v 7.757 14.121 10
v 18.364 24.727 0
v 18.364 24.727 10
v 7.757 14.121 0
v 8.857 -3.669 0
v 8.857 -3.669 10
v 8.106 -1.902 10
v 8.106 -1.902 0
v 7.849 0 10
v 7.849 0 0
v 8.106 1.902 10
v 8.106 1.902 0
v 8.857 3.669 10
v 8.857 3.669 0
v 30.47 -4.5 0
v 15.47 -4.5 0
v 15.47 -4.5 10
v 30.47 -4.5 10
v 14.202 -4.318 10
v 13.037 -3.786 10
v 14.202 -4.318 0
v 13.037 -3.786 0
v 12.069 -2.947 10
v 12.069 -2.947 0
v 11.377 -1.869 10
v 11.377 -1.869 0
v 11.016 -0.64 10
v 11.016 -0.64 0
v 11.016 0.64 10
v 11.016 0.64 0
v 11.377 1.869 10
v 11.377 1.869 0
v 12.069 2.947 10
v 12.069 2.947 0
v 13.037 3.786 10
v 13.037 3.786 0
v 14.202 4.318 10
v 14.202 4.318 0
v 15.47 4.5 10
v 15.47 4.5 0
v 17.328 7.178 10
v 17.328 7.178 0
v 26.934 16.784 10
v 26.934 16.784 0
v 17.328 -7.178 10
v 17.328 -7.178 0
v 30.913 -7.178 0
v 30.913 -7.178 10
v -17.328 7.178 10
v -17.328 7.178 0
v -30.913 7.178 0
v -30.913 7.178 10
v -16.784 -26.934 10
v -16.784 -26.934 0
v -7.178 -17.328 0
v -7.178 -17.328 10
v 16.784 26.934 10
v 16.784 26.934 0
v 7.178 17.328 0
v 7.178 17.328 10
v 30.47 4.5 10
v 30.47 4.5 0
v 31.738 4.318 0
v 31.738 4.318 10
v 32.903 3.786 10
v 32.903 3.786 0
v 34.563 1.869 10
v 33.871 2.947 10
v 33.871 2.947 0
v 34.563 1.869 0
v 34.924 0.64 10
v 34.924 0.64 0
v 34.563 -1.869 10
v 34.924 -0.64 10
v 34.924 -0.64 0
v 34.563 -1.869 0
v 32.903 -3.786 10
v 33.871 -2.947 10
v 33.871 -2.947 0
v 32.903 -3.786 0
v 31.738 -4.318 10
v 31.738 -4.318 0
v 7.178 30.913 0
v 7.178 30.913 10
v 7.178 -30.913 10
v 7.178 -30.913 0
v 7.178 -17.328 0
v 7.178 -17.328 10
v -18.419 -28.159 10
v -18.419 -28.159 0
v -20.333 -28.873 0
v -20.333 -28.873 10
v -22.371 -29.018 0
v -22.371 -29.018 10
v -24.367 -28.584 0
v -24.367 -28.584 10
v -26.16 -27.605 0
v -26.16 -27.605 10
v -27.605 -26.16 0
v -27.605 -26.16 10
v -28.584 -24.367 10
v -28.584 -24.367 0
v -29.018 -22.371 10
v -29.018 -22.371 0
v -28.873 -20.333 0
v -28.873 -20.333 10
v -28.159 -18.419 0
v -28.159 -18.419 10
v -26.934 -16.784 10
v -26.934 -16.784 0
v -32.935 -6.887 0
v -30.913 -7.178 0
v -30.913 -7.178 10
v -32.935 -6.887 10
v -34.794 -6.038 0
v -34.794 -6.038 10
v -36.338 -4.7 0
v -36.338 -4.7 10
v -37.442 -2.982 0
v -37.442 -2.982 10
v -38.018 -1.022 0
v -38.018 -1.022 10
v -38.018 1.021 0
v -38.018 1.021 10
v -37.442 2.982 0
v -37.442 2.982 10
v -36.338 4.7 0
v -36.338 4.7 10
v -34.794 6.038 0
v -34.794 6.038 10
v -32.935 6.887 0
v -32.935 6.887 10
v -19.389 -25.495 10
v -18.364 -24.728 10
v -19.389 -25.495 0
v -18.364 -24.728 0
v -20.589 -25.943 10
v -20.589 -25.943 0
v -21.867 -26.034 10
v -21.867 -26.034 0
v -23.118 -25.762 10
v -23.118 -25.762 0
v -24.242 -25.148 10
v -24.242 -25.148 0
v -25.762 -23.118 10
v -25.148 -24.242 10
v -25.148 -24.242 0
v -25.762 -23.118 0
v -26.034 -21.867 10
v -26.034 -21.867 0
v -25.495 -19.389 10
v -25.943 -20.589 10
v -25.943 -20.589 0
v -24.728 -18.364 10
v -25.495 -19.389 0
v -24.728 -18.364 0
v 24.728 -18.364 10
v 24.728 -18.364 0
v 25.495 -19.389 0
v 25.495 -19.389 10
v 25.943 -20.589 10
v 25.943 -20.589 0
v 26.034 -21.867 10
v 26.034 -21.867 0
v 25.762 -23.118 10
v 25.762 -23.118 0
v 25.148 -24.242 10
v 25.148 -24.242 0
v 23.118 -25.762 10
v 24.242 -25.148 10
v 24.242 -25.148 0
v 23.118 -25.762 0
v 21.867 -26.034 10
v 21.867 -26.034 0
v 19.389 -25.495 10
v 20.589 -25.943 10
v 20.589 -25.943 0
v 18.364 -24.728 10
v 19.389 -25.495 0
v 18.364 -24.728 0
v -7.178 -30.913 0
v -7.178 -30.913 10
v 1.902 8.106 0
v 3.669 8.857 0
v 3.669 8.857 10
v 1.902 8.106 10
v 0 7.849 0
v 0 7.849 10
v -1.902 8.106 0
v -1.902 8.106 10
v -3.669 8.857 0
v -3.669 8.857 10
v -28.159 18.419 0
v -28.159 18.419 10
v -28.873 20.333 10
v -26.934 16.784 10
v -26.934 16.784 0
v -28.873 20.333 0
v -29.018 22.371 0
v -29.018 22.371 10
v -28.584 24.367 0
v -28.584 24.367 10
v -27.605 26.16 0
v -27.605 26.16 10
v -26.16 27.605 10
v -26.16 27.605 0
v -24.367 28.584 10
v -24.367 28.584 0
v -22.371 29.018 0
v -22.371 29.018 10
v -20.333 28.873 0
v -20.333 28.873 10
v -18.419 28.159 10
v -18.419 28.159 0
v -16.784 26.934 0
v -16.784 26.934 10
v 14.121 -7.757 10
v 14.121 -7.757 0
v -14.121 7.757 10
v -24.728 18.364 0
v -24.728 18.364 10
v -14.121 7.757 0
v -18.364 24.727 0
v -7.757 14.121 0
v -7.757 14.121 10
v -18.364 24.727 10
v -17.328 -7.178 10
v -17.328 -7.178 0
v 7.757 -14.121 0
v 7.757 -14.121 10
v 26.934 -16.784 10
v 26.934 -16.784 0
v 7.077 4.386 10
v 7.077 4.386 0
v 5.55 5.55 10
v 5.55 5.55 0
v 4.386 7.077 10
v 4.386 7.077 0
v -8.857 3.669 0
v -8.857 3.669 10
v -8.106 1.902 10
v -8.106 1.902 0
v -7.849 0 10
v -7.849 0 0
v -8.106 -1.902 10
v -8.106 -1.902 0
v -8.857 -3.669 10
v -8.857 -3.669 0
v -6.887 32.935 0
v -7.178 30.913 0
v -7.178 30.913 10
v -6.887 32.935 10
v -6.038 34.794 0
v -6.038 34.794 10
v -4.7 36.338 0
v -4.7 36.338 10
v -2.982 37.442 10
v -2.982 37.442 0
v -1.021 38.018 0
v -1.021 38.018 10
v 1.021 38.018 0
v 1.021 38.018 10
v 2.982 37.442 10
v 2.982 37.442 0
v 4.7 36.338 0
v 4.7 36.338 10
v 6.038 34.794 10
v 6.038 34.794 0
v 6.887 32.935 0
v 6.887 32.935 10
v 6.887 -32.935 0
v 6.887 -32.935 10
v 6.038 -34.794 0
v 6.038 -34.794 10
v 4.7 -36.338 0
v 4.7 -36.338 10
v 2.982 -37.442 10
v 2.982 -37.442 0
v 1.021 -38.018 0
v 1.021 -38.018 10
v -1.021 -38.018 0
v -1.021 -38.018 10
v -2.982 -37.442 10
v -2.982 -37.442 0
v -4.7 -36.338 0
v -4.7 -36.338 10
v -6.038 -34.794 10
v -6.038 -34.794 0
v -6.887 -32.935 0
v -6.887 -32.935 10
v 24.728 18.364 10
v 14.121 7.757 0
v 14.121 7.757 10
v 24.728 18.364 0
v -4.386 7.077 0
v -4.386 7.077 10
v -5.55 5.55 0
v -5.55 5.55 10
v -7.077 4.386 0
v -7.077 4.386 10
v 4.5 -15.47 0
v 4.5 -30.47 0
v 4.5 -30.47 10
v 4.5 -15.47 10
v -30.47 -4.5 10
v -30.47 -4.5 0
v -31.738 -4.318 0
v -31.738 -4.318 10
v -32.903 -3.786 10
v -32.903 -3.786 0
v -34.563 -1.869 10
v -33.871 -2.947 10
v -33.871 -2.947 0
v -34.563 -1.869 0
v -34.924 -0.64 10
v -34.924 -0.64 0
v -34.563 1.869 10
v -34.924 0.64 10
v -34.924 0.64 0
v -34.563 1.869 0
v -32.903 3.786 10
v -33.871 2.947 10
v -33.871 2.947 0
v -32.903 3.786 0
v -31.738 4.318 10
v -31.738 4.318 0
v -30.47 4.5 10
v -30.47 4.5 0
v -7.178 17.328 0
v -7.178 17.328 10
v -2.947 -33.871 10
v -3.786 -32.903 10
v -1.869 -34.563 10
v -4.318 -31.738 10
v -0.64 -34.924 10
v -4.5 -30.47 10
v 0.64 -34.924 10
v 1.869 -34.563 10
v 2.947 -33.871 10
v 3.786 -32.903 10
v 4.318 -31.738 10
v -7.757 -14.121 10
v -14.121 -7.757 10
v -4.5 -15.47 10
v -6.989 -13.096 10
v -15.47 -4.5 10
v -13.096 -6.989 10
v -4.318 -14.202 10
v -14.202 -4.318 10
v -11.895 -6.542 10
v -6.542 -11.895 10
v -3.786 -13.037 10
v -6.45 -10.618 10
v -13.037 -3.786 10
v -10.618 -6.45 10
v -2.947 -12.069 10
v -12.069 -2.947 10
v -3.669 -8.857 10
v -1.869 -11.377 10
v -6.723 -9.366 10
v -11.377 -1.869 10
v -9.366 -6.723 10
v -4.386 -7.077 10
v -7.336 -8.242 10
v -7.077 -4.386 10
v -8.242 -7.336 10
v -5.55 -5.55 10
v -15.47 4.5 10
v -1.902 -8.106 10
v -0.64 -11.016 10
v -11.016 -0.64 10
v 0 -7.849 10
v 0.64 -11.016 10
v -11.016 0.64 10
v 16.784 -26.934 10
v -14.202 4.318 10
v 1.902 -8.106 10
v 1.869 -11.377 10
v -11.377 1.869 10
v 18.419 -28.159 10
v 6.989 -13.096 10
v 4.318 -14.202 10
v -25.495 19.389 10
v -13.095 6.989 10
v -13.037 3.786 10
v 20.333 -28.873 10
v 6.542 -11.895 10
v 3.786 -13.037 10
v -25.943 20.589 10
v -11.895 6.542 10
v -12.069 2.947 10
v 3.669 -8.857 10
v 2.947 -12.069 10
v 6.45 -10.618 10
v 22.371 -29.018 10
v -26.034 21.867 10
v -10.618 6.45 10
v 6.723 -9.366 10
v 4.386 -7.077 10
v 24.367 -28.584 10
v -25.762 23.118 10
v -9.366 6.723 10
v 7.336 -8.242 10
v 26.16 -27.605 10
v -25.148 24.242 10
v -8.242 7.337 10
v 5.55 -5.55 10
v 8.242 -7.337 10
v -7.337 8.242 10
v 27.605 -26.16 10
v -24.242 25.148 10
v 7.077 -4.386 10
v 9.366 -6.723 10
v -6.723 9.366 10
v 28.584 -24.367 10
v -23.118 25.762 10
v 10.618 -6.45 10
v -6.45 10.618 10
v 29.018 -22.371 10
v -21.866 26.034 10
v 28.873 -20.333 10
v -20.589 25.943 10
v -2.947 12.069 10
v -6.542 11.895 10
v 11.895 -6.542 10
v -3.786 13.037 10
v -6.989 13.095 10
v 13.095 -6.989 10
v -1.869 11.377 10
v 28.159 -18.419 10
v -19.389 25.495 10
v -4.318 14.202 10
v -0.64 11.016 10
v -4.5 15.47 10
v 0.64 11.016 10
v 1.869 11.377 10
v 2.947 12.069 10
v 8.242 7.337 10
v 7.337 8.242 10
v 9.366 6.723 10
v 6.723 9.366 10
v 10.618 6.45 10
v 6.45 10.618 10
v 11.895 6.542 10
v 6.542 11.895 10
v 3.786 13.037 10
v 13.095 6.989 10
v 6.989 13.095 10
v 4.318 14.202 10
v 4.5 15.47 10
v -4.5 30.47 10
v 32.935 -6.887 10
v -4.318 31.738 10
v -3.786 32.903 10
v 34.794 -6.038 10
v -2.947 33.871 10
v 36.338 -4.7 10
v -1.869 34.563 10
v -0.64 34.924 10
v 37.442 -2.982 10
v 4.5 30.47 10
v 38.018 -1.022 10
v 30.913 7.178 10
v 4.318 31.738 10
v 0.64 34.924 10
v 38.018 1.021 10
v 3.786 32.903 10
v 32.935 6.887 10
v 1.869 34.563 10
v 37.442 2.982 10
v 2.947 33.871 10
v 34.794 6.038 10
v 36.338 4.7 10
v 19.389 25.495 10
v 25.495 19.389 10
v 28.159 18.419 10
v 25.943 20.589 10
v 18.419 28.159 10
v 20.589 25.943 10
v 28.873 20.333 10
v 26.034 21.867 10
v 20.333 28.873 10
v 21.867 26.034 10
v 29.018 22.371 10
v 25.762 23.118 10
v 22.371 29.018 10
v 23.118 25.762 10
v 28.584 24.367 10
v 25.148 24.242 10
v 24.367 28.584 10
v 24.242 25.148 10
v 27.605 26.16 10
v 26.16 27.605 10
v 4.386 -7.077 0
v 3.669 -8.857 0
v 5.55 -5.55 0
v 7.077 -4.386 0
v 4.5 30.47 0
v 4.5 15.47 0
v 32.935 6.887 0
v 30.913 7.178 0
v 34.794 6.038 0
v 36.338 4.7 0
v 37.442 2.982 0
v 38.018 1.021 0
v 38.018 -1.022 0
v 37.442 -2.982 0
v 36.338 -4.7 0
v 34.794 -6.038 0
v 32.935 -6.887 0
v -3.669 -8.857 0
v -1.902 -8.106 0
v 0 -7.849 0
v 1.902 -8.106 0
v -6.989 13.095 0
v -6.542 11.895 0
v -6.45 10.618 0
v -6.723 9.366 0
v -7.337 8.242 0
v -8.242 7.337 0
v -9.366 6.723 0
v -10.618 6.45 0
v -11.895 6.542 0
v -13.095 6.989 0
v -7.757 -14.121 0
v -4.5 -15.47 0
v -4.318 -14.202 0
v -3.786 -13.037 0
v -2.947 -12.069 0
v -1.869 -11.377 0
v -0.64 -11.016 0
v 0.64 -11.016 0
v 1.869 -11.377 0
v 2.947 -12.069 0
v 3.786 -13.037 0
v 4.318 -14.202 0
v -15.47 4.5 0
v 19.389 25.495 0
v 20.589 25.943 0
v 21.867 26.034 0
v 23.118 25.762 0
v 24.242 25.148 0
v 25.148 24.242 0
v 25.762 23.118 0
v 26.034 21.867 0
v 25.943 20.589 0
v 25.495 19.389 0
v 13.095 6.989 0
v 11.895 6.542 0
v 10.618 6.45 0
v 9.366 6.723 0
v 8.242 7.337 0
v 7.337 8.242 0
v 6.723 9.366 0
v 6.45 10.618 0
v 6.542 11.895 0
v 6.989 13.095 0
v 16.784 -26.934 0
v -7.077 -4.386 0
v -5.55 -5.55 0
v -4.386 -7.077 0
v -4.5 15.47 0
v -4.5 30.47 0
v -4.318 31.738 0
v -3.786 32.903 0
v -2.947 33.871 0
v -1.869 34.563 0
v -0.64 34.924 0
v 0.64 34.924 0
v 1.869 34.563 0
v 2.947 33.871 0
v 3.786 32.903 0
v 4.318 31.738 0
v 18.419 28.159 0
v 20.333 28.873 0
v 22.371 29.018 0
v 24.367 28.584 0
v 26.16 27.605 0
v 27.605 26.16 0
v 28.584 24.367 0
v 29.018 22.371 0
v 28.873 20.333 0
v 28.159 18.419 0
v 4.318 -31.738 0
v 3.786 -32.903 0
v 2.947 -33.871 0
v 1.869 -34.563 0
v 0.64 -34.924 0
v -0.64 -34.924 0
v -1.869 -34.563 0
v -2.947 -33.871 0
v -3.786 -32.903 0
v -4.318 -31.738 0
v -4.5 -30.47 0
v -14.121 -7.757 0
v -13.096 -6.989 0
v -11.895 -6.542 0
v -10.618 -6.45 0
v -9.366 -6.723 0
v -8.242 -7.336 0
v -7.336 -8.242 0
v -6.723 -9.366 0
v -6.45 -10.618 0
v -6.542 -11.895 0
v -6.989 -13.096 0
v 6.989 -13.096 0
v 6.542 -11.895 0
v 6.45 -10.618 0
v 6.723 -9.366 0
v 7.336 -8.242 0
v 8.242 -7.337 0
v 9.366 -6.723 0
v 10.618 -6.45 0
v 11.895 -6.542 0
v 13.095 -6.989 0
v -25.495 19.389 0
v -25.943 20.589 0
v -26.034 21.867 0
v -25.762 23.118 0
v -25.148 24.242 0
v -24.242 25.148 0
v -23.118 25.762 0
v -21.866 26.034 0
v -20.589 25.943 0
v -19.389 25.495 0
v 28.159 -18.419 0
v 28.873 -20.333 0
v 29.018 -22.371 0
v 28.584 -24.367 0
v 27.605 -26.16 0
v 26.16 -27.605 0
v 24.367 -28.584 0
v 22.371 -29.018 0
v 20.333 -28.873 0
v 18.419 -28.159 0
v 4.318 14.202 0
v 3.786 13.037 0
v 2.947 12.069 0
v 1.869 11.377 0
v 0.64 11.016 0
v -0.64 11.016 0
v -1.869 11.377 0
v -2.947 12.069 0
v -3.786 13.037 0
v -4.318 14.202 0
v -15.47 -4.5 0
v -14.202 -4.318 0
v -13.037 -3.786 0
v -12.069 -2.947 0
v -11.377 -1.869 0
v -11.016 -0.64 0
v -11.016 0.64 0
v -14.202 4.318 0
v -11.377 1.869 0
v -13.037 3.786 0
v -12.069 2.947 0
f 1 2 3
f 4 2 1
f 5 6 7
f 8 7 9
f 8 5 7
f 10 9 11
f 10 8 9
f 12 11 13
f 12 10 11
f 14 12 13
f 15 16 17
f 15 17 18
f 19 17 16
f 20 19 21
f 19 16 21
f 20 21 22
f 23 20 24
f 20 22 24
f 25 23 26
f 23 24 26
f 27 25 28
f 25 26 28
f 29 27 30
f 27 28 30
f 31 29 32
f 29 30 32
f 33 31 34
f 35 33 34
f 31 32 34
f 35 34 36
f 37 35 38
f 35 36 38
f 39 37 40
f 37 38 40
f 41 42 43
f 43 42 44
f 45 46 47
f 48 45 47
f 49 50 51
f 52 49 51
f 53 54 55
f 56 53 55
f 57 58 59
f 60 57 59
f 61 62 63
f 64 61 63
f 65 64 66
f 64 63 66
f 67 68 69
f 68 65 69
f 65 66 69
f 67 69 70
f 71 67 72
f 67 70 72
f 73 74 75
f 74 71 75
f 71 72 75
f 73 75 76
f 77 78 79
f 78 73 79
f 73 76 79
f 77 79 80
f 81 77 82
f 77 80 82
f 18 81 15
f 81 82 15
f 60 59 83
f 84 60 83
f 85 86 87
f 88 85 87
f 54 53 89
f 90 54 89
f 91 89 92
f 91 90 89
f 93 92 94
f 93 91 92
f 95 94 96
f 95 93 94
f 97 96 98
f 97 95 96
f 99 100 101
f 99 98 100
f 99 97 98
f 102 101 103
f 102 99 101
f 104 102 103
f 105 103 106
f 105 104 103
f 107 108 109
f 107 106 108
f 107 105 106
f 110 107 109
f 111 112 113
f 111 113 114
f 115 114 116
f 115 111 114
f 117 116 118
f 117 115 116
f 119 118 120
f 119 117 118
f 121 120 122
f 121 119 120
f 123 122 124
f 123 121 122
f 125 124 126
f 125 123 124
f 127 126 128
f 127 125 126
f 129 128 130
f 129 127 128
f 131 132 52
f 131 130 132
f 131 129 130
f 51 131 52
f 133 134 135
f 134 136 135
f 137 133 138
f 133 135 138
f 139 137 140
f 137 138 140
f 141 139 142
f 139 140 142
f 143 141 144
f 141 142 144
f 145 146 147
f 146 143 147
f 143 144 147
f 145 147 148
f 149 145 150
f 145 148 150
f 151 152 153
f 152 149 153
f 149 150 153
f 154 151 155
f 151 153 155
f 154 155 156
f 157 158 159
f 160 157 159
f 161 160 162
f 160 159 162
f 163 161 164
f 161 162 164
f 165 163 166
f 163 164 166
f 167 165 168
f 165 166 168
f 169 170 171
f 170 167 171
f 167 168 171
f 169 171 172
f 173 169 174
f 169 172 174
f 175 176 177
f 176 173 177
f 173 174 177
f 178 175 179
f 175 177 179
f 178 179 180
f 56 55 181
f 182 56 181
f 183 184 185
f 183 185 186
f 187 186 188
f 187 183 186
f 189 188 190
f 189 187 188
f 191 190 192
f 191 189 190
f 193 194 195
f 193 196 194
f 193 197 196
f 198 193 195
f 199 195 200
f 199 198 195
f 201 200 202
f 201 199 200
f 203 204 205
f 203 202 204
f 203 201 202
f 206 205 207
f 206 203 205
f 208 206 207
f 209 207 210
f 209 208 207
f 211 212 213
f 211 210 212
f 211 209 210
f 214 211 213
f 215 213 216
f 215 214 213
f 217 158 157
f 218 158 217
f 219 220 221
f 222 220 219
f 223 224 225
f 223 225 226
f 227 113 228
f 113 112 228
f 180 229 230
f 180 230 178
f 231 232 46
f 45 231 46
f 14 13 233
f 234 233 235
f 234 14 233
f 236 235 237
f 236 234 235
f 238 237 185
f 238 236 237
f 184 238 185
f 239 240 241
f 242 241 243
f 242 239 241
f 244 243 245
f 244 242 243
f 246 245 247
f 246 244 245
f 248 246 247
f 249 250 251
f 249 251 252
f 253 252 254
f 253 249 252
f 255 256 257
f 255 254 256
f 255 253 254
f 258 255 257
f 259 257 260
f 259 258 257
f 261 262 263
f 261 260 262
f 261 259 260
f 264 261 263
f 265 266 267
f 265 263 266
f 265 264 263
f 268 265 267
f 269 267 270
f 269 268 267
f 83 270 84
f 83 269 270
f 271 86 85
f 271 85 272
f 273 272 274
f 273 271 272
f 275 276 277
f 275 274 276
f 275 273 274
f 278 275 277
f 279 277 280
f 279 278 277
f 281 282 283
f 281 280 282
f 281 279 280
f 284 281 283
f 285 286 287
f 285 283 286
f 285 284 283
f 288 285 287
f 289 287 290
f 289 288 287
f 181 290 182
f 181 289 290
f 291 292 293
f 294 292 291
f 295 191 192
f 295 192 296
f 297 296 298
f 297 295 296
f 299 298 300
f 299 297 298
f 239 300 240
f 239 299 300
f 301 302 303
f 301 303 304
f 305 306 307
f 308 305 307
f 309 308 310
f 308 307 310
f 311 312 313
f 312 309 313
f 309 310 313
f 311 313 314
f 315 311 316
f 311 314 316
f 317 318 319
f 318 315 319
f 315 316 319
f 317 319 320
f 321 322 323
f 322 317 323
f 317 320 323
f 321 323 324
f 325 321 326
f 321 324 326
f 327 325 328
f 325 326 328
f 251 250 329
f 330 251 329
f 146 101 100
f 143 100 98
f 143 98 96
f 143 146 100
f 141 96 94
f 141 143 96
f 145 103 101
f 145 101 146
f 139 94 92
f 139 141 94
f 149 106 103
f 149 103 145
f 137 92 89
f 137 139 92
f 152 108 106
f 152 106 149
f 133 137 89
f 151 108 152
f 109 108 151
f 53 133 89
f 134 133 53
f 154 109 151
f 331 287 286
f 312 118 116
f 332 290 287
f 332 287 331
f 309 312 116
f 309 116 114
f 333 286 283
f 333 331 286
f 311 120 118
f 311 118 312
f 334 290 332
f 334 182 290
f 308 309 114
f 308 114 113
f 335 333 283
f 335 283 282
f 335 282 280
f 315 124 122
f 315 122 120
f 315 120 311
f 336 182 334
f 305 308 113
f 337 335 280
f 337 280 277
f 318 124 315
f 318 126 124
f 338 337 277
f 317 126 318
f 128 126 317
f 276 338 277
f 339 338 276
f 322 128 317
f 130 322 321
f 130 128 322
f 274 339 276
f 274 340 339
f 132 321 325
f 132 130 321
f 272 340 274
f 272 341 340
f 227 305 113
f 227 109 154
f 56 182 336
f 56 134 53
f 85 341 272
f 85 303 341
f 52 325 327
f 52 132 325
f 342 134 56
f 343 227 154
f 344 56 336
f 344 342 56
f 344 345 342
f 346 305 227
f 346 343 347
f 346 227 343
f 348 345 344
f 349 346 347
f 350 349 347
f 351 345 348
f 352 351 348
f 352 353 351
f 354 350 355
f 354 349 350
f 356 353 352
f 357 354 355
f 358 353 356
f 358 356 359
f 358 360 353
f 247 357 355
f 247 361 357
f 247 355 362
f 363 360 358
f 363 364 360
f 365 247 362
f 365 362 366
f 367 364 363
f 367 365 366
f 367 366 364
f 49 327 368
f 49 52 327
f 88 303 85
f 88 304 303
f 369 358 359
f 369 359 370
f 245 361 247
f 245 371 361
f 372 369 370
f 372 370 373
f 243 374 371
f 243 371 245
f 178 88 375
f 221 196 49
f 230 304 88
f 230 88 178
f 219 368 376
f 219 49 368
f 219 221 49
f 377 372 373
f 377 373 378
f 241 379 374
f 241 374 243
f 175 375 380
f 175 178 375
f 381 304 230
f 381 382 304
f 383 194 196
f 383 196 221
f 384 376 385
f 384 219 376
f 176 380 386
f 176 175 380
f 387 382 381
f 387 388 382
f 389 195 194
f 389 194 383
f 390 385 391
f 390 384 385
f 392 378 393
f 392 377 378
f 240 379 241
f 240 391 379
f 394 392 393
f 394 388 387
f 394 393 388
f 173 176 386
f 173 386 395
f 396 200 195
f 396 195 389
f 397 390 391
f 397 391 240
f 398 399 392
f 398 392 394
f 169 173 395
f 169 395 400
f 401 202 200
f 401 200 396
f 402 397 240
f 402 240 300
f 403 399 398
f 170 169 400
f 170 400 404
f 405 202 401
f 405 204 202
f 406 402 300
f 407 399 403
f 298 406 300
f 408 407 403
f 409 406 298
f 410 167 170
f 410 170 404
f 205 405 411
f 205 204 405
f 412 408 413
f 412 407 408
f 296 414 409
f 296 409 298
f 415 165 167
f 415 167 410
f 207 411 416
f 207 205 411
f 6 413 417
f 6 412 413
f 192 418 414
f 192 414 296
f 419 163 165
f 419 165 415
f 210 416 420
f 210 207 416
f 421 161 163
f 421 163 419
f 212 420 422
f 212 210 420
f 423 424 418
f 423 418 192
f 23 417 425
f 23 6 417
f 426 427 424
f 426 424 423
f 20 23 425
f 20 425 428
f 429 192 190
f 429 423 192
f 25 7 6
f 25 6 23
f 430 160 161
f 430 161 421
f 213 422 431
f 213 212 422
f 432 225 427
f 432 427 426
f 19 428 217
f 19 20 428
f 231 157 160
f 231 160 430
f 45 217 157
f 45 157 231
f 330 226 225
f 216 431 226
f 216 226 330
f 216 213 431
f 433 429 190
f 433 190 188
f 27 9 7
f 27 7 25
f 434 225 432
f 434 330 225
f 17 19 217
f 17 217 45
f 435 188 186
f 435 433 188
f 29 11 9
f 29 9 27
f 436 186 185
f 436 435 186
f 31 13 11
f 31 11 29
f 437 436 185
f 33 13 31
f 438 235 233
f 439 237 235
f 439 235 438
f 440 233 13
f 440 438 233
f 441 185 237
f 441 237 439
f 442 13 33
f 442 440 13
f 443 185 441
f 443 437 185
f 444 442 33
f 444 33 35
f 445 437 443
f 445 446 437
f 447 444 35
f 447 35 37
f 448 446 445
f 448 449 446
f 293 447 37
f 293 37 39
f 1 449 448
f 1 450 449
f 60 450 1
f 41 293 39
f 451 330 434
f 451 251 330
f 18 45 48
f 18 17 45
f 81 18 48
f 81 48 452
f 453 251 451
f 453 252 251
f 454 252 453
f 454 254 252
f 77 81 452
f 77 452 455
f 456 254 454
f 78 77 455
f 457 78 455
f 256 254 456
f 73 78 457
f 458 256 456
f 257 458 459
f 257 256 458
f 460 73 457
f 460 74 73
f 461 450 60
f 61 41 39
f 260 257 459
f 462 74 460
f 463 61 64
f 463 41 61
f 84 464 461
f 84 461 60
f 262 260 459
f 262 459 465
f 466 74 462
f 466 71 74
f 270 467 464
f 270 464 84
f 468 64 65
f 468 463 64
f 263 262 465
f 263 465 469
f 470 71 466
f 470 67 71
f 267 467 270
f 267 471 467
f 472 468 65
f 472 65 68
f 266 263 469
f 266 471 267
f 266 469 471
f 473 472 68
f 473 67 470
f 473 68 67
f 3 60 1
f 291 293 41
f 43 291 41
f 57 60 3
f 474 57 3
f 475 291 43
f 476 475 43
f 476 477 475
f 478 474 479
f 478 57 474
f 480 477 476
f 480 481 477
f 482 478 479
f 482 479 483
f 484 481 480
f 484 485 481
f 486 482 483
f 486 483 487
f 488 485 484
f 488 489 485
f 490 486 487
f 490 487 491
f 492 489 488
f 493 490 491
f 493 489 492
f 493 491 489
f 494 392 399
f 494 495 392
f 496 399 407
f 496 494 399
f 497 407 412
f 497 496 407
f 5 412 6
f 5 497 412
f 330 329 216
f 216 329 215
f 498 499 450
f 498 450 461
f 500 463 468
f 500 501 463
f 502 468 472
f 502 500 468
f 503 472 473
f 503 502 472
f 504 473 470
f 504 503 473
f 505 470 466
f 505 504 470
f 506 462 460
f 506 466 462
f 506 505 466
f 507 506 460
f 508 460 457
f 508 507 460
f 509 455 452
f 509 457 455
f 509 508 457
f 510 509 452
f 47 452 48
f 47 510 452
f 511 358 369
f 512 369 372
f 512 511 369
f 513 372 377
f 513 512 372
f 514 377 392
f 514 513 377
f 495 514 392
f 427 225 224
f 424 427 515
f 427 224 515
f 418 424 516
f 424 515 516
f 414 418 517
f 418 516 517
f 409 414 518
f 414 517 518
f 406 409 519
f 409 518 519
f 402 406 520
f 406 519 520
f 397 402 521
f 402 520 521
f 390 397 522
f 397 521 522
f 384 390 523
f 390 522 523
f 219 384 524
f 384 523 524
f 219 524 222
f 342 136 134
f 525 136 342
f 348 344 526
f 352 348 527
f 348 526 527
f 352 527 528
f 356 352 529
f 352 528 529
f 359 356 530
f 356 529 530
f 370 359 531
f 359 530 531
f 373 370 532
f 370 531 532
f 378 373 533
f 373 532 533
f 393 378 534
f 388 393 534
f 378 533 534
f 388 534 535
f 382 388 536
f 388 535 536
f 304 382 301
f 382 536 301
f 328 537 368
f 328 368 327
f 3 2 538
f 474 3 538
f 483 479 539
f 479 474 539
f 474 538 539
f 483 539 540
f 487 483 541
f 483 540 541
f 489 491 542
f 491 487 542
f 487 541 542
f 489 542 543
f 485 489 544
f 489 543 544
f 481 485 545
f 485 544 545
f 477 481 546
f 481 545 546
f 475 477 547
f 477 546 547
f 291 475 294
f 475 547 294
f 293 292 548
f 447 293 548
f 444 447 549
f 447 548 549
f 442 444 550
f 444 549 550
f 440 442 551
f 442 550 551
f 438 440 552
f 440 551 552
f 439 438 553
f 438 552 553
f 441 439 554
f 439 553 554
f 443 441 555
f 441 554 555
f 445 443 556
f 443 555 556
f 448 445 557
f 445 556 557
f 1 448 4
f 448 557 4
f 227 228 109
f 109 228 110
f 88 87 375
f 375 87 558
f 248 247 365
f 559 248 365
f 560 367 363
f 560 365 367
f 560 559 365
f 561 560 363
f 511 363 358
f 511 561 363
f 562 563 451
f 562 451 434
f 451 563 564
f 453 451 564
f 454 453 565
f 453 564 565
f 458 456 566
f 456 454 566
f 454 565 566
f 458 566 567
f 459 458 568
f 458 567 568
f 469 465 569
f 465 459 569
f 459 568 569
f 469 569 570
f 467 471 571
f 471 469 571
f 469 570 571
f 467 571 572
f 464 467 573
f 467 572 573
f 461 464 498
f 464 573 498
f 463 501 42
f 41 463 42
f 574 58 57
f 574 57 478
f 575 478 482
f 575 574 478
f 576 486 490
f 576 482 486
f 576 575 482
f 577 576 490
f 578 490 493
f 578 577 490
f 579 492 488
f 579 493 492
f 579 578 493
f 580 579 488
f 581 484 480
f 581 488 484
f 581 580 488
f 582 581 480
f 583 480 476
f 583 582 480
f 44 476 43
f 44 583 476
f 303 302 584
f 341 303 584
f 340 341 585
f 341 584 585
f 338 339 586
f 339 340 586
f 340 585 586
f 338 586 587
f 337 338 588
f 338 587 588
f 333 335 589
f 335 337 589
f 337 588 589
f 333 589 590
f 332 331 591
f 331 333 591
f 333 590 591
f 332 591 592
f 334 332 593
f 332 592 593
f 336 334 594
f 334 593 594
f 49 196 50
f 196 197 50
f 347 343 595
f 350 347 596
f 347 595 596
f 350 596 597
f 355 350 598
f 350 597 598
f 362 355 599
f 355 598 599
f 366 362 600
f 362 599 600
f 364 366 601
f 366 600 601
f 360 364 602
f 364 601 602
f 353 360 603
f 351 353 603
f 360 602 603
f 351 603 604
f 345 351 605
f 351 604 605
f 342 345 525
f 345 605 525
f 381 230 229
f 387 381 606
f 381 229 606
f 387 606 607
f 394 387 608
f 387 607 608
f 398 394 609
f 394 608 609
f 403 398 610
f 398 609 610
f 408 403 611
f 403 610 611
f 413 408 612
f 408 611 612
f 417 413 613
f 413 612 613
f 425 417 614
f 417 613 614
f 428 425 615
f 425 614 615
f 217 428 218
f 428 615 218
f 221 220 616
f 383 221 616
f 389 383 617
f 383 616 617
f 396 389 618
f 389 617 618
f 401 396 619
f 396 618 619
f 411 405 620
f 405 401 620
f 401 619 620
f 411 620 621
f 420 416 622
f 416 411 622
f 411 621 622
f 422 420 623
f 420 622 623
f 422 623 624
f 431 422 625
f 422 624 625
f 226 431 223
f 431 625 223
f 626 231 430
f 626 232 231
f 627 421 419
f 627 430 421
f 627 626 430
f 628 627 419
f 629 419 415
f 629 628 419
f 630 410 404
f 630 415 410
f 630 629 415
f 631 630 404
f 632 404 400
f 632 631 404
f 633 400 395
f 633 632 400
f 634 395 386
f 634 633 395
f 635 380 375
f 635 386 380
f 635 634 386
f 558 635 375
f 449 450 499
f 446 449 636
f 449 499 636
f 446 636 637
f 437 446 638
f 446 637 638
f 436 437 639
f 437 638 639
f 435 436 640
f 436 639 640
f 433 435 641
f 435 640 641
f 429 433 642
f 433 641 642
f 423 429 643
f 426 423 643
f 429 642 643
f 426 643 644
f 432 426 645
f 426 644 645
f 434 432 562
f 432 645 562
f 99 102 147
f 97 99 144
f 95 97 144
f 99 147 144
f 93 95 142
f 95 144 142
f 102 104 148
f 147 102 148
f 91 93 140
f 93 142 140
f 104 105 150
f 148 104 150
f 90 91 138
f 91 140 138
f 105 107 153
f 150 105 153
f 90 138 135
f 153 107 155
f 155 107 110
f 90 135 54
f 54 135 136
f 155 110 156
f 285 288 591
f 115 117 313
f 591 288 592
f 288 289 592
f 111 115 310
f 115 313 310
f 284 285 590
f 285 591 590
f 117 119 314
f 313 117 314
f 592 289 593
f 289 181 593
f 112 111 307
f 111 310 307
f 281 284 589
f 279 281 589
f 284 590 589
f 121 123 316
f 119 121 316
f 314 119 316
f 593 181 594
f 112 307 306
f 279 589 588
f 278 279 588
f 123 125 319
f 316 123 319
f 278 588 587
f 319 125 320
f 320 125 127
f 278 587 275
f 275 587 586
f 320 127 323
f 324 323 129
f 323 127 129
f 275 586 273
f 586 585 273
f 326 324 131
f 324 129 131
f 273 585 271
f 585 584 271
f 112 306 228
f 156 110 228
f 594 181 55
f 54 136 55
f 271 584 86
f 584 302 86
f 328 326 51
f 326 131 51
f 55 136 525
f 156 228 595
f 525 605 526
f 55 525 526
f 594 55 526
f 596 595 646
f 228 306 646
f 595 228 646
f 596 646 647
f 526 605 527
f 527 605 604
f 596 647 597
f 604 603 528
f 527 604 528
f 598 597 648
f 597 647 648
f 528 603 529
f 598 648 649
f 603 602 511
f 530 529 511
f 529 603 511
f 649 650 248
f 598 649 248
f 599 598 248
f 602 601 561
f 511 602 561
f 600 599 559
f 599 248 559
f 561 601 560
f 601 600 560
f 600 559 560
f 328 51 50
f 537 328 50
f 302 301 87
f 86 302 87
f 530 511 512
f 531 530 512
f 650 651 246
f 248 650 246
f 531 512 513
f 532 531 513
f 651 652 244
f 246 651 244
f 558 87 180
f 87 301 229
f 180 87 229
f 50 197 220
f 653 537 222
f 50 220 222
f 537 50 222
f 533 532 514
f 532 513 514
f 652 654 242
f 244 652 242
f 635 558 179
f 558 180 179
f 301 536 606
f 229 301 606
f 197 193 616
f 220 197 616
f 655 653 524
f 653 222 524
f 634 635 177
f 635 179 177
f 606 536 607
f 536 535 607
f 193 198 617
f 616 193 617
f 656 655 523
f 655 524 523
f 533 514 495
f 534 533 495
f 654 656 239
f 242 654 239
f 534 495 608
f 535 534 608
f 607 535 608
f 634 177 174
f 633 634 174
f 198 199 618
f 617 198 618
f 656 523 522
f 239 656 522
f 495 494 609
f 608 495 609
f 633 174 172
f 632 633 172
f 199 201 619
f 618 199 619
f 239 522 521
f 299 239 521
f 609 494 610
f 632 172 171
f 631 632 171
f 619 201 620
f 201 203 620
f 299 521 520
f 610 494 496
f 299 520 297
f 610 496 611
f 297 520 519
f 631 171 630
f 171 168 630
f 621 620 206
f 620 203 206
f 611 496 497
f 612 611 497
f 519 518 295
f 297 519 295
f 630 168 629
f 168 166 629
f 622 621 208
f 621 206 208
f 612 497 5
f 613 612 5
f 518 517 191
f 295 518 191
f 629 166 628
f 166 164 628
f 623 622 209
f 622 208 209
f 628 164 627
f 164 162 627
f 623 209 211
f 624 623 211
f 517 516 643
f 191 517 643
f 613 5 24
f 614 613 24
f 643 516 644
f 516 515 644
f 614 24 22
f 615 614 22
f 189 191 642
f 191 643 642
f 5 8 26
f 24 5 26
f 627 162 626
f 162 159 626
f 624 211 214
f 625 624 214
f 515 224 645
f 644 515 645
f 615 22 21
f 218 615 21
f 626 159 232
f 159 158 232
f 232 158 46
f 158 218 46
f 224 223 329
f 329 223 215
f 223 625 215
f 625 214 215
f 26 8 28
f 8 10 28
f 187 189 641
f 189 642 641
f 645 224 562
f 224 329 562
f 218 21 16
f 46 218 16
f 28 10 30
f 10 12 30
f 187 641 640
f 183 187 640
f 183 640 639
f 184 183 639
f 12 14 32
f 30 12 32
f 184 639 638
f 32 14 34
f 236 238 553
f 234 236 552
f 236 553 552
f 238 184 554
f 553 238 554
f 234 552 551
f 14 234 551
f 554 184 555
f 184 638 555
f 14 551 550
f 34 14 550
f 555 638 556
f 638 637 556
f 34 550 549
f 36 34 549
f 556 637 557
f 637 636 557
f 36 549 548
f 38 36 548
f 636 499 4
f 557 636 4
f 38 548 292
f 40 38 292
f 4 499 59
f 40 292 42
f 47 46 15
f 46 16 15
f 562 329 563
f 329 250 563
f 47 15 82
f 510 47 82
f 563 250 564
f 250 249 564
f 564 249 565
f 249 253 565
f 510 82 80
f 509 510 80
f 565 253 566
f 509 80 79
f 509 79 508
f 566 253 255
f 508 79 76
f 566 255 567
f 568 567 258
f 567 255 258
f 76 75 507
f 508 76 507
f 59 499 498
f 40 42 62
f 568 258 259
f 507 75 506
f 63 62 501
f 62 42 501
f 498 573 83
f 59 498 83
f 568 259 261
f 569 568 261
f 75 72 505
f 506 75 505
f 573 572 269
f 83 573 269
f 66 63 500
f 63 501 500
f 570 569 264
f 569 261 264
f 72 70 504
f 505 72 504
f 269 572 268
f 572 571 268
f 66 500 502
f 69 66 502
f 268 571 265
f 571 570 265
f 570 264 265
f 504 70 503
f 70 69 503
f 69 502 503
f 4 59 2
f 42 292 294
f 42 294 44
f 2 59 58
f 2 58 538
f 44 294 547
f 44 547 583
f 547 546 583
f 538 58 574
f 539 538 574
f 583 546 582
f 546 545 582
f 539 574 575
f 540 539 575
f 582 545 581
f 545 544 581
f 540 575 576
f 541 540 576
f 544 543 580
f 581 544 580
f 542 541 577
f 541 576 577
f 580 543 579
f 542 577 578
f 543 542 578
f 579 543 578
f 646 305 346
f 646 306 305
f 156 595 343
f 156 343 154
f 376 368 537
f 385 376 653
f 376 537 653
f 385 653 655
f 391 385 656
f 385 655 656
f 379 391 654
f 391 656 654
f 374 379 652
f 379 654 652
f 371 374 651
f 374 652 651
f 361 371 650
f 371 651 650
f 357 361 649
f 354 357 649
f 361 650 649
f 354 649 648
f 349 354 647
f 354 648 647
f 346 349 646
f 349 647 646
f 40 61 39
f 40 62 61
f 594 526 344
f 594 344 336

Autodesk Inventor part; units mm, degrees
ref_plane "YZ Plane" through (0, 0, 0) normal (1, 0, 0) x (0, 1, 0)
ref_plane "XZ Plane" through (0, 0, 0) normal (0, 1, 0) x (-1, 0, 0)
ref_plane "XY Plane" through (0, 0, 0) normal (0, 0, 1) x (1, 0, 0)
sketch "Sketch1" plane through (0, 0, 0) normal (0, 0, 1) x (1, 0, 0)
  line L0 (0, 30.4699) -> (0, 15.4699) construction
  line L1 (4, 30.4699) -> (4, 15.4699)
  line L2 (-4, 15.4699) -> (-4, 30.4699)
  arc A0 (4, 30.4699) -> (-4, 30.4699) centre (0, 30.4699) ccw
  arc A1 (-4, 15.4699) -> (4, 15.4699) centre (0, 15.4699) ccw
  circle A2 centre (0, 0) radius 22.9699 construction
  arc A3 (-18.717, 24.3739) -> (-24.3739, 18.717) centre (-21.5455, 21.5455) ccw
  line L3 (-18.717, 24.3739) -> (-8.1104, 13.7673)
  arc A4 (-13.7673, 8.1104) -> (-8.1104, 13.7673) centre (-10.9389, 10.9389) ccw
  line L4 (-13.7673, 8.1104) -> (-24.3739, 18.717)
  circle A5 centre (0, 0) radius 22.9699 construction
  arc A6 (-30.4699, 4) -> (-30.4699, -4) centre (-30.4699, 0) ccw
  line L5 (-30.4699, 4) -> (-15.4699, 4)
  arc A7 (-15.4699, -4) -> (-15.4699, 4) centre (-15.4699, 0) ccw
  line L6 (-15.4699, -4) -> (-30.4699, -4)
  circle A8 centre (0, 0) radius 22.9699 construction
  arc A9 (-24.3739, -18.7171) -> (-18.717, -24.3739) centre (-21.5455, -21.5455) ccw
  line L7 (-24.3739, -18.7171) -> (-13.7673, -8.1105)
  arc A10 (-8.1104, -13.7673) -> (-13.7673, -8.1105) centre (-10.9389, -10.9389) ccw
  line L8 (-8.1104, -13.7673) -> (-18.717, -24.3739)
  circle A11 centre (0, 0) radius 22.9699 construction
  arc A12 (-4, -30.4699) -> (4, -30.4699) centre (0, -30.4699) ccw
  line L9 (-4, -30.4699) -> (-4, -15.4699)
  arc A13 (4, -15.4699) -> (-4, -15.4699) centre (0, -15.4699) ccw
  line L10 (4, -15.4699) -> (4, -30.4699)
  circle A14 centre (0, 0) radius 22.9699 construction
  arc A15 (18.717, -24.3739) -> (24.3739, -18.7171) centre (21.5455, -21.5455) ccw
  line L11 (18.717, -24.3739) -> (8.1104, -13.7673)
  arc A16 (13.7673, -8.1105) -> (8.1104, -13.7673) centre (10.9389, -10.9389) ccw
  line L12 (13.7673, -8.1105) -> (24.3739, -18.7171)
  circle A17 centre (0, 0) radius 22.9699 construction
  arc A18 (30.4699, -4) -> (30.4699, 4) centre (30.4699, 0) ccw
  line L13 (30.4699, -4) -> (15.4699, -4)
  arc A19 (15.4699, 4) -> (15.4699, -4) centre (15.4699, 0) ccw
  line L14 (15.4699, 4) -> (30.4699, 4)
  circle A20 centre (0, 0) radius 22.9699 construction
  arc A21 (24.3739, 18.717) -> (18.717, 24.3739) centre (21.5455, 21.5455) ccw
  line L15 (24.3739, 18.717) -> (13.7673, 8.1104)
  arc A22 (8.1104, 13.7673) -> (13.7673, 8.1104) centre (10.9389, 10.9389) ccw
  line L16 (8.1104, 13.7673) -> (18.717, 24.3739)
  circle A23 centre (0, 0) radius 22.9699 construction
  line L17 (18.3635, 24.7274) -> (7.7569, 14.1208)
  arc A24 (7.7569, 14.1208) -> (14.1208, 7.7569) centre (10.9389, 10.9389) ccw
  line L18 (14.1208, 7.7569) -> (24.7275, 18.3635)
  arc A25 (24.7275, 18.3635) -> (18.3635, 24.7274) centre (21.5455, 21.5455) ccw
  line L19 (-4.5, 30.4699) -> (-4.5, 15.4699)
  arc A26 (-4.5, 15.4699) -> (4.5, 15.4699) centre (0, 15.4699) ccw
  line L20 (4.5, 15.4699) -> (4.5, 30.4699)
  arc A27 (4.5, 30.4699) -> (-4.5, 30.4699) centre (0, 30.4699) ccw
  line L21 (-7.7569, 14.1208) -> (-18.3635, 24.7274)
  arc A28 (-18.3635, 24.7274) -> (-24.7275, 18.3635) centre (-21.5455, 21.5455) ccw
  line L22 (-24.7275, 18.3635) -> (-14.1208, 7.7569)
  arc A29 (-14.1208, 7.7569) -> (-7.7569, 14.1208) centre (-10.9389, 10.9389) ccw
  line L23 (-15.4699, 4.5) -> (-30.4699, 4.5)
  arc A30 (-30.4699, 4.5) -> (-30.4699, -4.5) centre (-30.4699, 0) ccw
  line L24 (-30.4699, -4.5) -> (-15.4699, -4.5)
  arc A31 (-15.4699, -4.5) -> (-15.4699, 4.5) centre (-15.4699, 0) ccw
  line L25 (15.4699, -4.5) -> (30.4699, -4.5)
  arc A32 (30.4699, -4.5) -> (30.4699, 4.5) centre (30.4699, 0) ccw
  line L26 (30.4699, 4.5) -> (15.4699, 4.5)
  arc A33 (15.4699, 4.5) -> (15.4699, -4.5) centre (15.4699, 0) ccw
  line L27 (-14.1209, -7.7569) -> (-24.7275, -18.3635)
  arc A34 (-24.7275, -18.3635) -> (-18.3635, -24.7275) centre (-21.5455, -21.5455) ccw
  line L28 (-18.3635, -24.7275) -> (-7.7569, -14.1209)
  arc A35 (-7.7569, -14.1209) -> (-14.1209, -7.7569) centre (-10.9389, -10.9389) ccw
  line L29 (-4.5, -15.4699) -> (-4.5, -30.4699)
  arc A36 (-4.5, -30.4699) -> (4.5, -30.4699) centre (0, -30.4699) ccw
  line L30 (4.5, -30.4699) -> (4.5, -15.4699)
  arc A37 (4.5, -15.4699) -> (-4.5, -15.4699) centre (0, -15.4699) ccw
  line L31 (7.7569, -14.1209) -> (18.3635, -24.7275)
  arc A38 (18.3635, -24.7275) -> (24.7275, -18.3635) centre (21.5455, -21.5455) ccw
  line L32 (24.7275, -18.3635) -> (14.1208, -7.7569)
  arc A39 (14.1208, -7.7569) -> (7.7569, -14.1209) centre (10.9389, -10.9389) ccw
  circle A40 centre (0, 0) radius 9
  line L33 (0, 30.9133) -> (0, 15.0265) construction
  line L34 (-7.1776, 30.9133) -> (-7.1776, 15.0265)
  line L35 (7.1776, 15.0265) -> (7.1776, 30.9133)
  arc A41 (7.1776, 30.9133) -> (-7.1776, 30.9133) centre (0, 30.9133) ccw
  arc A42 (-7.1776, 15.0265) -> (7.1776, 15.0265) centre (0, 15.0265) ccw
  arc A43 (-16.7836, 26.9344) -> (-26.9344, 16.7836) centre (-21.859, 21.859) ccw
  line L36 (-5.55, 15.7007) -> (-16.7836, 26.9344)
  arc A44 (-15.7007, 5.5499) -> (-5.55, 15.7007) centre (-10.6253, 10.6253) ccw
  line L37 (-26.9344, 16.7836) -> (-15.7007, 5.5499)
  arc A45 (-30.9133, 7.1776) -> (-30.9133, -7.1777) centre (-30.9133, 0) ccw
  line L38 (-15.0265, 7.1776) -> (-30.9133, 7.1776)
  arc A46 (-15.0265, -7.1777) -> (-15.0265, 7.1776) centre (-15.0265, 0) ccw
  line L39 (-30.9133, -7.1777) -> (-15.0265, -7.1777)
  arc A47 (-26.9344, -16.7837) -> (-16.7836, -26.9344) centre (-21.859, -21.859) ccw
  line L40 (-15.7007, -5.55) -> (-26.9344, -16.7837)
  arc A48 (-5.55, -15.7007) -> (-15.7007, -5.55) centre (-10.6253, -10.6253) ccw
  line L41 (-16.7836, -26.9344) -> (-5.55, -15.7007)
  arc A49 (-7.1776, -30.9133) -> (7.1776, -30.9133) centre (0, -30.9133) ccw
  line L42 (-7.1776, -15.0265) -> (-7.1776, -30.9133)
  arc A50 (7.1776, -15.0265) -> (-7.1776, -15.0265) centre (0, -15.0265) ccw
  line L43 (7.1776, -30.9133) -> (7.1776, -15.0265)
  arc A51 (16.7836, -26.9344) -> (26.9344, -16.7837) centre (21.859, -21.859) ccw
  line L44 (5.55, -15.7007) -> (16.7836, -26.9344)
  arc A52 (15.7007, -5.55) -> (5.55, -15.7007) centre (10.6253, -10.6253) ccw
  line L45 (26.9344, -16.7837) -> (15.7007, -5.55)
  arc A53 (30.9133, -7.1777) -> (30.9133, 7.1776) centre (30.9133, 0) ccw
  line L46 (15.0265, -7.1777) -> (30.9133, -7.1777)
  arc A54 (15.0265, 7.1776) -> (15.0265, -7.1777) centre (15.0265, 0) ccw
  line L47 (30.9133, 7.1776) -> (15.0265, 7.1776)
  arc A55 (26.9344, 16.7836) -> (16.7836, 26.9344) centre (21.859, 21.859) ccw
  line L48 (15.7007, 5.5499) -> (26.9344, 16.7836)
  arc A56 (5.55, 15.7007) -> (15.7007, 5.5499) centre (10.6253, 10.6253) ccw
  line L49 (16.7836, 26.9344) -> (5.55, 15.7007)
  point P0 (0, 0)
  point P1 (0, 22.9699)
  point P2 (-16.2422, 16.2422)
  point P3 (-22.9699, 0)
  point P4 (-16.2422, -16.2422)
  point P5 (0, -22.9699)
  point P6 (16.2422, -16.2422)
  point P7 (22.9699, 0)
  point P8 (16.2422, 16.2422)
  dimension "d2" = 4
  dimension "d3" = 15
  dimension "d4" = 360
  dimension "d6" = 0.5
  dimension "d7" = 0.5
  dimension "d8" = 0.5
  dimension "d9" = 0.5
  dimension "d10" = 0.5
  dimension "d11" = 0.5
  dimension "d12" = 0.5
  dimension "d13" = 0.5
  dimension "d14" = 18
  dimension "d17" = 360
extrude "Extrusion1" add sketch "Sketch1" along normal blind 10 contours L17 A24 A42 L35 L49 A55 L48 L47 A54 L18 A25 | A24 A54 A56 A40 A42 | A42 A56 L49 L35 | A54 L47 L48 A56 | A42 A40 A44 A26 A56 | A56 A33 A52 A54 A40 | A42 A40 | A26 L20 A27 L19 A44 L36 L34 A41 L35 L49 A56 | A40 A56 | L47 A53 L46 L45 A52 A33 L25 A32 L26 A56 L48 | A40 A54 | A44 A42 L34 L36 | A52 L45 L46 A54 | A44 A40 | A40 A44 A46 A29 A42 | A52 A54 A39 A50 A40 | A40 A52 | A29 L21 A28 L22 A46 L38 L37 A43 L36 L34 A42 | L45 A51 L44 L43 A50 A39 L31 A38 L32 A54 L46 | A46 A40 | A40 A46 A48 A31 A44 | A44 L37 L38 A46 | A50 A52 A37 A48 A40 | A40 A50 | A50 L43 L44 A52 | A31 L23 A30 L24 A48 L40 L39 A45 L38 L37 A44 | A52 L44 L43 A49 L42 L41 A48 A37 L29 A36 L30 | A48 A40 | A40 A48 A50 A35 A46 | A46 L39 L40 A48 | A48 L41 L42 A50 | A35 L27 A34 L28 A50 L42 L41 A47 L40 L39 A46
properties part number "location hole mounter"
